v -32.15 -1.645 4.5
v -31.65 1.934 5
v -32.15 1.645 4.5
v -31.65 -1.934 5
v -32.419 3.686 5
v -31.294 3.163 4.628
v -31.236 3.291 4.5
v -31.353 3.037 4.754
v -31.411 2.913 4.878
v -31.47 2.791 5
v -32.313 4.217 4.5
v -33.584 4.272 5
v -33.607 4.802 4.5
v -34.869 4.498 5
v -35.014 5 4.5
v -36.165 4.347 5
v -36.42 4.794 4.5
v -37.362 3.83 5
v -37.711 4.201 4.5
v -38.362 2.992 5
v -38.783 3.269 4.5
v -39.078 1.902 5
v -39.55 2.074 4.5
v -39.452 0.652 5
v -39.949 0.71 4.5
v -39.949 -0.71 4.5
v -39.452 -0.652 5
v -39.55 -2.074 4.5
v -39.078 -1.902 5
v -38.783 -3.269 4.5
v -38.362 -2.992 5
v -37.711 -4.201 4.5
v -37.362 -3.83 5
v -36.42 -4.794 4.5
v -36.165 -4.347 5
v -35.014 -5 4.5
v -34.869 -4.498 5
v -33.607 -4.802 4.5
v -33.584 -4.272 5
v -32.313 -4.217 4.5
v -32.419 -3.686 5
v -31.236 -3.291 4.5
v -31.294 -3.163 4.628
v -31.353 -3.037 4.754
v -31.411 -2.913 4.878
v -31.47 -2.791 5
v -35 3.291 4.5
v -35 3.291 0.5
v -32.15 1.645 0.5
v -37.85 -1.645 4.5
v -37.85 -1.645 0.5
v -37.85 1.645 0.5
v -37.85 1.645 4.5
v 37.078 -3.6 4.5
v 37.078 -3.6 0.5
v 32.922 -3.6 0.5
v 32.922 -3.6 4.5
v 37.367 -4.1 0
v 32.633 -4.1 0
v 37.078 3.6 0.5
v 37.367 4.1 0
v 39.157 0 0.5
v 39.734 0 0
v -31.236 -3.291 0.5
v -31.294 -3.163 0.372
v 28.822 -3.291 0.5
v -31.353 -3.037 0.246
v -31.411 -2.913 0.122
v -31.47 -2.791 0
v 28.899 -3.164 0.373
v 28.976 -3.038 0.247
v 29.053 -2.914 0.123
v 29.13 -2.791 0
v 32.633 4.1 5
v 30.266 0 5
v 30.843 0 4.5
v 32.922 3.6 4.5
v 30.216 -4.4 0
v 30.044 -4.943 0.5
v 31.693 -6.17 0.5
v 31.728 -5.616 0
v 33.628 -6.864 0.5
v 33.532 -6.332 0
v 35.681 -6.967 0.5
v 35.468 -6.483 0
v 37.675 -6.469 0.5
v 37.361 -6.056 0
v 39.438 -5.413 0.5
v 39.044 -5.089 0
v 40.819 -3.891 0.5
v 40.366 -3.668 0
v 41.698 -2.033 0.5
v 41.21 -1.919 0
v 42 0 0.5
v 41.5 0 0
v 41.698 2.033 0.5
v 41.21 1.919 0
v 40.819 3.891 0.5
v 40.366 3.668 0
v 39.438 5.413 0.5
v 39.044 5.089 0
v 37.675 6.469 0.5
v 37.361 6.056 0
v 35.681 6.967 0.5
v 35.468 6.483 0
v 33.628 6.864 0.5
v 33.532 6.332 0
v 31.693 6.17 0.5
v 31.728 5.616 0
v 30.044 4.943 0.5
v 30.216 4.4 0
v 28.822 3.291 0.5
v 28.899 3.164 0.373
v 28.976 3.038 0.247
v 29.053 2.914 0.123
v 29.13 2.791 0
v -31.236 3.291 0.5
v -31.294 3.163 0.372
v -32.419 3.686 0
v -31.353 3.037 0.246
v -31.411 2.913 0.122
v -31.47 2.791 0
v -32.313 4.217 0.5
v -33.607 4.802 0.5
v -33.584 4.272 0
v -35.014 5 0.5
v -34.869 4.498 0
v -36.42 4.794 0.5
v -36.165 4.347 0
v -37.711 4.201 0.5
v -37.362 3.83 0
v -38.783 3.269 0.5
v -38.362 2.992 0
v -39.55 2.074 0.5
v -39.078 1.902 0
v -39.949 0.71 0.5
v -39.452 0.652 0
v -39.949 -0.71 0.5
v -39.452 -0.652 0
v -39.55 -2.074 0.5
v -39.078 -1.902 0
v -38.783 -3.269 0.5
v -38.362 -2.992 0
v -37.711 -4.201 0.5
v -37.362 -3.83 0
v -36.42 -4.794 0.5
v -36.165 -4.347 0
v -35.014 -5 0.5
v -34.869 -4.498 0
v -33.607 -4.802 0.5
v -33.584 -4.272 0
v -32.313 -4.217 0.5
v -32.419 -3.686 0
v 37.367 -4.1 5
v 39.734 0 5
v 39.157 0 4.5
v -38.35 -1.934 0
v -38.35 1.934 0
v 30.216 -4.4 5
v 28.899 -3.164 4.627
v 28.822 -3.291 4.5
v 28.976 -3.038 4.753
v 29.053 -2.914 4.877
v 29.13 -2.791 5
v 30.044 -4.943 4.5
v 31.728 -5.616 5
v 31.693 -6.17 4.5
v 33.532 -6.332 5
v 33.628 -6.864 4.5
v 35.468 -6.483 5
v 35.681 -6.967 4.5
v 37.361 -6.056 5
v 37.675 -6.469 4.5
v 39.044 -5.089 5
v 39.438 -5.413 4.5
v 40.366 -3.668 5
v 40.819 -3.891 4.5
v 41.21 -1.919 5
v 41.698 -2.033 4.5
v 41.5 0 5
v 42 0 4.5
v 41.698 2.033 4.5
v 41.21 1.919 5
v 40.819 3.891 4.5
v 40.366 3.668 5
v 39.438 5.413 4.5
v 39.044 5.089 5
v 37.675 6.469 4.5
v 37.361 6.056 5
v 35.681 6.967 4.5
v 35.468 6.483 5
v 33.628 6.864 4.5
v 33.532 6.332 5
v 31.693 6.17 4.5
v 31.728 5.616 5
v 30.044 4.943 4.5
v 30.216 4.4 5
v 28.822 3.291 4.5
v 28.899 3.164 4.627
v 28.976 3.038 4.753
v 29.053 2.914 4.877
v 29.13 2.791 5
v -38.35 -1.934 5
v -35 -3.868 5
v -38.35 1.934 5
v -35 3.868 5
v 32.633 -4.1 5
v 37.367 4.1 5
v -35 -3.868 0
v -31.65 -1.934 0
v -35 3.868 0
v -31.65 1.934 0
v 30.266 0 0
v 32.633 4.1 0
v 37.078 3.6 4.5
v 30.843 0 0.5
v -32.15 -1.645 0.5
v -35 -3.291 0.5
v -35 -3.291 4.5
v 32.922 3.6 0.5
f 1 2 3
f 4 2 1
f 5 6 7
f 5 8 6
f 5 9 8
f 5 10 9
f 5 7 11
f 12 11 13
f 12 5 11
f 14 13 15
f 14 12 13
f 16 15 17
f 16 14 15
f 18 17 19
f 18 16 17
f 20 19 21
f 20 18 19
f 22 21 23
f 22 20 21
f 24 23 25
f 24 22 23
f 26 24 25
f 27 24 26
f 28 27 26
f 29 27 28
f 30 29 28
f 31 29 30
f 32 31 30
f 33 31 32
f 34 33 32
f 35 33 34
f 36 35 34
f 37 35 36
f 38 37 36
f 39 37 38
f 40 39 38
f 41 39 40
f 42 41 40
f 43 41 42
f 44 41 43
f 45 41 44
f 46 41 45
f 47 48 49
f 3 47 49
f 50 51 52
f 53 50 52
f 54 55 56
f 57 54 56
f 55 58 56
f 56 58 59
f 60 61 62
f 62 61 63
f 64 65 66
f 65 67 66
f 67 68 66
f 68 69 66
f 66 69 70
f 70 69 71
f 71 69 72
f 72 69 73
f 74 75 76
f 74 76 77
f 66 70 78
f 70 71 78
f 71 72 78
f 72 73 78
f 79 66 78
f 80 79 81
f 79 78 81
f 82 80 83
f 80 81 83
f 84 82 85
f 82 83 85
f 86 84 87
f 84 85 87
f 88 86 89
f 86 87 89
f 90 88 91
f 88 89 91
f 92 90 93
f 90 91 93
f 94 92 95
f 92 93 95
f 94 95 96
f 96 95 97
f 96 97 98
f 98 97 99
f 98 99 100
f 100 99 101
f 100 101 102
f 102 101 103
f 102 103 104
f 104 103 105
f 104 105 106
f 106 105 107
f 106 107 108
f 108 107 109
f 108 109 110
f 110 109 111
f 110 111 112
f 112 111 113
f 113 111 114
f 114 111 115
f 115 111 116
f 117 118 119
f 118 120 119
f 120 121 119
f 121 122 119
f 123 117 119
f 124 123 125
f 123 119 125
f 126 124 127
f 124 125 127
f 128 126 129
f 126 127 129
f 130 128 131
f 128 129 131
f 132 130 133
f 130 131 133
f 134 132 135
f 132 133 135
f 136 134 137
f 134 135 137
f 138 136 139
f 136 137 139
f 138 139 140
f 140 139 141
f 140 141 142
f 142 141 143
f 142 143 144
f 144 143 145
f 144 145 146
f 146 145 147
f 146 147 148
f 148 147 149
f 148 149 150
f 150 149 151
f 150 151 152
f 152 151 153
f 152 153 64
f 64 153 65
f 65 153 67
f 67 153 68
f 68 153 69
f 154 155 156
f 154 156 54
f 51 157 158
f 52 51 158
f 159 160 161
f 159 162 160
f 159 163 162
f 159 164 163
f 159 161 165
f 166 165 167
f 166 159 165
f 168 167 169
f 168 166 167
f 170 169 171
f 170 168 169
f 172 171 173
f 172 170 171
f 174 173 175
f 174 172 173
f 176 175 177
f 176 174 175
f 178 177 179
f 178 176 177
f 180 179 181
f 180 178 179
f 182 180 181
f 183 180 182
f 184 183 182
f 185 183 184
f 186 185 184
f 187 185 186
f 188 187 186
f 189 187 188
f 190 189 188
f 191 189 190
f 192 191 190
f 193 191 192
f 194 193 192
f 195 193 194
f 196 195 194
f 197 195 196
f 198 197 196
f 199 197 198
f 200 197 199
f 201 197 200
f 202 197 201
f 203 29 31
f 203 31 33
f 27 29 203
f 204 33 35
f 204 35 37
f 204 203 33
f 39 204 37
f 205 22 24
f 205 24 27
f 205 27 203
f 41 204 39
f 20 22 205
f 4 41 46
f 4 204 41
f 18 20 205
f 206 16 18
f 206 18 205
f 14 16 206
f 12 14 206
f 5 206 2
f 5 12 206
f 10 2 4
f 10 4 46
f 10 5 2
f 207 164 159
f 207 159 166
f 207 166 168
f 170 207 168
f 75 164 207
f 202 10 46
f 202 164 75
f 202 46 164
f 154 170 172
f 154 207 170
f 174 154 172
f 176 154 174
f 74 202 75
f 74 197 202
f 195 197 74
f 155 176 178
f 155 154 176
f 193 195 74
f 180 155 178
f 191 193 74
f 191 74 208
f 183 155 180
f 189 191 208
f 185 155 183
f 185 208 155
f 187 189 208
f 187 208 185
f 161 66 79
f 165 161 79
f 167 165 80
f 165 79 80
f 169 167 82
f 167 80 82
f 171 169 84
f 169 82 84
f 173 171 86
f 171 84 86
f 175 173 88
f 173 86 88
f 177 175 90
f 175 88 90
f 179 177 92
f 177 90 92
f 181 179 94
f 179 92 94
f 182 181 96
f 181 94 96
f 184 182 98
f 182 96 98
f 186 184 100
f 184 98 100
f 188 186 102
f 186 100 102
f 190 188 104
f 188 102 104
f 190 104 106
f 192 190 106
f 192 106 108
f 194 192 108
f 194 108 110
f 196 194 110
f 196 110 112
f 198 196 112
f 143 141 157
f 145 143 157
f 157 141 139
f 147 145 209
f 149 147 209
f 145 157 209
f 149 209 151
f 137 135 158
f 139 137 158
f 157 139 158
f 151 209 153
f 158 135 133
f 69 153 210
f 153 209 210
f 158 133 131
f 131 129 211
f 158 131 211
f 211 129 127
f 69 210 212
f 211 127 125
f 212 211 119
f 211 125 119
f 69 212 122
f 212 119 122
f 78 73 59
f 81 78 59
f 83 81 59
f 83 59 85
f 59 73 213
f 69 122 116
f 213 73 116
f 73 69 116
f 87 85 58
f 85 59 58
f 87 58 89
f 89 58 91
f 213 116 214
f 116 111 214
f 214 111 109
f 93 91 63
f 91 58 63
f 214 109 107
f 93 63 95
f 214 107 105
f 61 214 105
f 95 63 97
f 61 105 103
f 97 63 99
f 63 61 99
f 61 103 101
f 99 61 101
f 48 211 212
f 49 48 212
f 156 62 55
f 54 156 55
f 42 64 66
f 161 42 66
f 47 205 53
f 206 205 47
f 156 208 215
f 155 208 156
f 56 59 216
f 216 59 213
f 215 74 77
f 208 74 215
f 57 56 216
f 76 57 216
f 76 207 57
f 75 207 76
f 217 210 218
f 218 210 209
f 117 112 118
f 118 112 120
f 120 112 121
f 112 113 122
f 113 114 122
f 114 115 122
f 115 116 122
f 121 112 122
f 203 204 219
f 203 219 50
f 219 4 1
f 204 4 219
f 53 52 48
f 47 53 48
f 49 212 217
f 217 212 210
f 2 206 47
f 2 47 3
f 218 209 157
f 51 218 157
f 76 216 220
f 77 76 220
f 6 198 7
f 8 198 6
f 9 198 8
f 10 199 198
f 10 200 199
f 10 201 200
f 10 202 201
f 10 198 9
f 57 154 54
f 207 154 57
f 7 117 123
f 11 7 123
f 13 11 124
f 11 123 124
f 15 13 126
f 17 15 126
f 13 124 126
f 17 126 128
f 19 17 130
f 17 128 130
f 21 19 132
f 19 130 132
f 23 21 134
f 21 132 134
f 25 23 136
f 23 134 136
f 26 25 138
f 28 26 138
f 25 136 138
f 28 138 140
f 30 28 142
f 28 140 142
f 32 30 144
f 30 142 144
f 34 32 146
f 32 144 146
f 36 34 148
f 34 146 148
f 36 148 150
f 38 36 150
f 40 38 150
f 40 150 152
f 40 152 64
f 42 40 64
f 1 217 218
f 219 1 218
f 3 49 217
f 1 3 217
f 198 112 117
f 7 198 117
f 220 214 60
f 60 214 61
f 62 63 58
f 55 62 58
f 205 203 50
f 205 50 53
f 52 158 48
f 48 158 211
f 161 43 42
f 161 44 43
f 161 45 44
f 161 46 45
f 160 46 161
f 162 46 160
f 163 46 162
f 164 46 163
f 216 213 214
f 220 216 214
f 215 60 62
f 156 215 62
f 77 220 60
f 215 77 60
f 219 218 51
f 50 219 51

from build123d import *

# Parameters (mm, degrees)
F1_DEPTH = 5
F2_SIZE  = 0.5


with BuildPart() as f1:
    # F0 (on Top) → F1 (new body)
    with BuildSketch(Plane.XY):
        with BuildLine():
            Line((28.821813, 3.290897), (-31.235694, 3.290897))
            ThreePointArc((-31.235694, 3.290897), (-40, 0), (-31.235694, -3.290897))
            Line((-31.235694, -3.290897), (28.821813, -3.290897))
            ThreePointArc((28.821813, -3.290897), (42, 0), (28.821813, 3.290897))
        make_face()
        Polygon((-32.15, 1.645448), (-32.15, -1.645448), (-35, -3.290897), (-37.85, -1.645448), (-37.85, 1.645448), (-35, 3.290897), align=None, mode=Mode.SUBTRACT)
        Polygon((39.156922, 0), (37.078461, -3.6), (32.921539, -3.6), (30.843078, 0), (32.921539, 3.6), (37.078461, 3.6), align=None, mode=Mode.SUBTRACT)
    extrude(amount=F1_DEPTH)

    # F2
    f2_edges = [f1.edges().sort_by_distance(p)[0] for p in [
        (-36.425, 2.468172, 5),
        (-33.575, 2.468172, 5),
        (-32.15, 0, 5),
        (-33.575, -2.468172, 5),
        (-36.425, -2.468172, 5),
        (-37.85, 0, 5),
        (42, 0, 5),
        (-1.206941, 3.290897, 5),
        (-40, 0, 5),
        (-1.206941, -3.290897, 5),
        (35, 3.6, 5),
        (38.117691, 1.8, 5),
        (38.117691, -1.8, 5),
        (35, -3.6, 5),
        (31.882309, -1.8, 5),
        (31.882309, 1.8, 5),
        (42, 0, 0),
        (-1.206941, 3.290897, 0),
        (-40, 0, 0),
        (-1.206941, -3.290897, 0),
        (-33.575, 2.468172, 0),
        (-32.15, 0, 0),
        (-33.575, -2.468172, 0),
        (-36.425, -2.468172, 0),
        (-37.85, 0, 0),
        (-36.425, 2.468172, 0),
        (35, 3.6, 0),
        (38.117691, 1.8, 0),
        (38.117691, -1.8, 0),
        (35, -3.6, 0),
        (31.882309, -1.8, 0),
        (31.882309, 1.8, 0),
    ]]
    chamfer(f2_edges, length=F2_SIZE)


solid = f1.part
